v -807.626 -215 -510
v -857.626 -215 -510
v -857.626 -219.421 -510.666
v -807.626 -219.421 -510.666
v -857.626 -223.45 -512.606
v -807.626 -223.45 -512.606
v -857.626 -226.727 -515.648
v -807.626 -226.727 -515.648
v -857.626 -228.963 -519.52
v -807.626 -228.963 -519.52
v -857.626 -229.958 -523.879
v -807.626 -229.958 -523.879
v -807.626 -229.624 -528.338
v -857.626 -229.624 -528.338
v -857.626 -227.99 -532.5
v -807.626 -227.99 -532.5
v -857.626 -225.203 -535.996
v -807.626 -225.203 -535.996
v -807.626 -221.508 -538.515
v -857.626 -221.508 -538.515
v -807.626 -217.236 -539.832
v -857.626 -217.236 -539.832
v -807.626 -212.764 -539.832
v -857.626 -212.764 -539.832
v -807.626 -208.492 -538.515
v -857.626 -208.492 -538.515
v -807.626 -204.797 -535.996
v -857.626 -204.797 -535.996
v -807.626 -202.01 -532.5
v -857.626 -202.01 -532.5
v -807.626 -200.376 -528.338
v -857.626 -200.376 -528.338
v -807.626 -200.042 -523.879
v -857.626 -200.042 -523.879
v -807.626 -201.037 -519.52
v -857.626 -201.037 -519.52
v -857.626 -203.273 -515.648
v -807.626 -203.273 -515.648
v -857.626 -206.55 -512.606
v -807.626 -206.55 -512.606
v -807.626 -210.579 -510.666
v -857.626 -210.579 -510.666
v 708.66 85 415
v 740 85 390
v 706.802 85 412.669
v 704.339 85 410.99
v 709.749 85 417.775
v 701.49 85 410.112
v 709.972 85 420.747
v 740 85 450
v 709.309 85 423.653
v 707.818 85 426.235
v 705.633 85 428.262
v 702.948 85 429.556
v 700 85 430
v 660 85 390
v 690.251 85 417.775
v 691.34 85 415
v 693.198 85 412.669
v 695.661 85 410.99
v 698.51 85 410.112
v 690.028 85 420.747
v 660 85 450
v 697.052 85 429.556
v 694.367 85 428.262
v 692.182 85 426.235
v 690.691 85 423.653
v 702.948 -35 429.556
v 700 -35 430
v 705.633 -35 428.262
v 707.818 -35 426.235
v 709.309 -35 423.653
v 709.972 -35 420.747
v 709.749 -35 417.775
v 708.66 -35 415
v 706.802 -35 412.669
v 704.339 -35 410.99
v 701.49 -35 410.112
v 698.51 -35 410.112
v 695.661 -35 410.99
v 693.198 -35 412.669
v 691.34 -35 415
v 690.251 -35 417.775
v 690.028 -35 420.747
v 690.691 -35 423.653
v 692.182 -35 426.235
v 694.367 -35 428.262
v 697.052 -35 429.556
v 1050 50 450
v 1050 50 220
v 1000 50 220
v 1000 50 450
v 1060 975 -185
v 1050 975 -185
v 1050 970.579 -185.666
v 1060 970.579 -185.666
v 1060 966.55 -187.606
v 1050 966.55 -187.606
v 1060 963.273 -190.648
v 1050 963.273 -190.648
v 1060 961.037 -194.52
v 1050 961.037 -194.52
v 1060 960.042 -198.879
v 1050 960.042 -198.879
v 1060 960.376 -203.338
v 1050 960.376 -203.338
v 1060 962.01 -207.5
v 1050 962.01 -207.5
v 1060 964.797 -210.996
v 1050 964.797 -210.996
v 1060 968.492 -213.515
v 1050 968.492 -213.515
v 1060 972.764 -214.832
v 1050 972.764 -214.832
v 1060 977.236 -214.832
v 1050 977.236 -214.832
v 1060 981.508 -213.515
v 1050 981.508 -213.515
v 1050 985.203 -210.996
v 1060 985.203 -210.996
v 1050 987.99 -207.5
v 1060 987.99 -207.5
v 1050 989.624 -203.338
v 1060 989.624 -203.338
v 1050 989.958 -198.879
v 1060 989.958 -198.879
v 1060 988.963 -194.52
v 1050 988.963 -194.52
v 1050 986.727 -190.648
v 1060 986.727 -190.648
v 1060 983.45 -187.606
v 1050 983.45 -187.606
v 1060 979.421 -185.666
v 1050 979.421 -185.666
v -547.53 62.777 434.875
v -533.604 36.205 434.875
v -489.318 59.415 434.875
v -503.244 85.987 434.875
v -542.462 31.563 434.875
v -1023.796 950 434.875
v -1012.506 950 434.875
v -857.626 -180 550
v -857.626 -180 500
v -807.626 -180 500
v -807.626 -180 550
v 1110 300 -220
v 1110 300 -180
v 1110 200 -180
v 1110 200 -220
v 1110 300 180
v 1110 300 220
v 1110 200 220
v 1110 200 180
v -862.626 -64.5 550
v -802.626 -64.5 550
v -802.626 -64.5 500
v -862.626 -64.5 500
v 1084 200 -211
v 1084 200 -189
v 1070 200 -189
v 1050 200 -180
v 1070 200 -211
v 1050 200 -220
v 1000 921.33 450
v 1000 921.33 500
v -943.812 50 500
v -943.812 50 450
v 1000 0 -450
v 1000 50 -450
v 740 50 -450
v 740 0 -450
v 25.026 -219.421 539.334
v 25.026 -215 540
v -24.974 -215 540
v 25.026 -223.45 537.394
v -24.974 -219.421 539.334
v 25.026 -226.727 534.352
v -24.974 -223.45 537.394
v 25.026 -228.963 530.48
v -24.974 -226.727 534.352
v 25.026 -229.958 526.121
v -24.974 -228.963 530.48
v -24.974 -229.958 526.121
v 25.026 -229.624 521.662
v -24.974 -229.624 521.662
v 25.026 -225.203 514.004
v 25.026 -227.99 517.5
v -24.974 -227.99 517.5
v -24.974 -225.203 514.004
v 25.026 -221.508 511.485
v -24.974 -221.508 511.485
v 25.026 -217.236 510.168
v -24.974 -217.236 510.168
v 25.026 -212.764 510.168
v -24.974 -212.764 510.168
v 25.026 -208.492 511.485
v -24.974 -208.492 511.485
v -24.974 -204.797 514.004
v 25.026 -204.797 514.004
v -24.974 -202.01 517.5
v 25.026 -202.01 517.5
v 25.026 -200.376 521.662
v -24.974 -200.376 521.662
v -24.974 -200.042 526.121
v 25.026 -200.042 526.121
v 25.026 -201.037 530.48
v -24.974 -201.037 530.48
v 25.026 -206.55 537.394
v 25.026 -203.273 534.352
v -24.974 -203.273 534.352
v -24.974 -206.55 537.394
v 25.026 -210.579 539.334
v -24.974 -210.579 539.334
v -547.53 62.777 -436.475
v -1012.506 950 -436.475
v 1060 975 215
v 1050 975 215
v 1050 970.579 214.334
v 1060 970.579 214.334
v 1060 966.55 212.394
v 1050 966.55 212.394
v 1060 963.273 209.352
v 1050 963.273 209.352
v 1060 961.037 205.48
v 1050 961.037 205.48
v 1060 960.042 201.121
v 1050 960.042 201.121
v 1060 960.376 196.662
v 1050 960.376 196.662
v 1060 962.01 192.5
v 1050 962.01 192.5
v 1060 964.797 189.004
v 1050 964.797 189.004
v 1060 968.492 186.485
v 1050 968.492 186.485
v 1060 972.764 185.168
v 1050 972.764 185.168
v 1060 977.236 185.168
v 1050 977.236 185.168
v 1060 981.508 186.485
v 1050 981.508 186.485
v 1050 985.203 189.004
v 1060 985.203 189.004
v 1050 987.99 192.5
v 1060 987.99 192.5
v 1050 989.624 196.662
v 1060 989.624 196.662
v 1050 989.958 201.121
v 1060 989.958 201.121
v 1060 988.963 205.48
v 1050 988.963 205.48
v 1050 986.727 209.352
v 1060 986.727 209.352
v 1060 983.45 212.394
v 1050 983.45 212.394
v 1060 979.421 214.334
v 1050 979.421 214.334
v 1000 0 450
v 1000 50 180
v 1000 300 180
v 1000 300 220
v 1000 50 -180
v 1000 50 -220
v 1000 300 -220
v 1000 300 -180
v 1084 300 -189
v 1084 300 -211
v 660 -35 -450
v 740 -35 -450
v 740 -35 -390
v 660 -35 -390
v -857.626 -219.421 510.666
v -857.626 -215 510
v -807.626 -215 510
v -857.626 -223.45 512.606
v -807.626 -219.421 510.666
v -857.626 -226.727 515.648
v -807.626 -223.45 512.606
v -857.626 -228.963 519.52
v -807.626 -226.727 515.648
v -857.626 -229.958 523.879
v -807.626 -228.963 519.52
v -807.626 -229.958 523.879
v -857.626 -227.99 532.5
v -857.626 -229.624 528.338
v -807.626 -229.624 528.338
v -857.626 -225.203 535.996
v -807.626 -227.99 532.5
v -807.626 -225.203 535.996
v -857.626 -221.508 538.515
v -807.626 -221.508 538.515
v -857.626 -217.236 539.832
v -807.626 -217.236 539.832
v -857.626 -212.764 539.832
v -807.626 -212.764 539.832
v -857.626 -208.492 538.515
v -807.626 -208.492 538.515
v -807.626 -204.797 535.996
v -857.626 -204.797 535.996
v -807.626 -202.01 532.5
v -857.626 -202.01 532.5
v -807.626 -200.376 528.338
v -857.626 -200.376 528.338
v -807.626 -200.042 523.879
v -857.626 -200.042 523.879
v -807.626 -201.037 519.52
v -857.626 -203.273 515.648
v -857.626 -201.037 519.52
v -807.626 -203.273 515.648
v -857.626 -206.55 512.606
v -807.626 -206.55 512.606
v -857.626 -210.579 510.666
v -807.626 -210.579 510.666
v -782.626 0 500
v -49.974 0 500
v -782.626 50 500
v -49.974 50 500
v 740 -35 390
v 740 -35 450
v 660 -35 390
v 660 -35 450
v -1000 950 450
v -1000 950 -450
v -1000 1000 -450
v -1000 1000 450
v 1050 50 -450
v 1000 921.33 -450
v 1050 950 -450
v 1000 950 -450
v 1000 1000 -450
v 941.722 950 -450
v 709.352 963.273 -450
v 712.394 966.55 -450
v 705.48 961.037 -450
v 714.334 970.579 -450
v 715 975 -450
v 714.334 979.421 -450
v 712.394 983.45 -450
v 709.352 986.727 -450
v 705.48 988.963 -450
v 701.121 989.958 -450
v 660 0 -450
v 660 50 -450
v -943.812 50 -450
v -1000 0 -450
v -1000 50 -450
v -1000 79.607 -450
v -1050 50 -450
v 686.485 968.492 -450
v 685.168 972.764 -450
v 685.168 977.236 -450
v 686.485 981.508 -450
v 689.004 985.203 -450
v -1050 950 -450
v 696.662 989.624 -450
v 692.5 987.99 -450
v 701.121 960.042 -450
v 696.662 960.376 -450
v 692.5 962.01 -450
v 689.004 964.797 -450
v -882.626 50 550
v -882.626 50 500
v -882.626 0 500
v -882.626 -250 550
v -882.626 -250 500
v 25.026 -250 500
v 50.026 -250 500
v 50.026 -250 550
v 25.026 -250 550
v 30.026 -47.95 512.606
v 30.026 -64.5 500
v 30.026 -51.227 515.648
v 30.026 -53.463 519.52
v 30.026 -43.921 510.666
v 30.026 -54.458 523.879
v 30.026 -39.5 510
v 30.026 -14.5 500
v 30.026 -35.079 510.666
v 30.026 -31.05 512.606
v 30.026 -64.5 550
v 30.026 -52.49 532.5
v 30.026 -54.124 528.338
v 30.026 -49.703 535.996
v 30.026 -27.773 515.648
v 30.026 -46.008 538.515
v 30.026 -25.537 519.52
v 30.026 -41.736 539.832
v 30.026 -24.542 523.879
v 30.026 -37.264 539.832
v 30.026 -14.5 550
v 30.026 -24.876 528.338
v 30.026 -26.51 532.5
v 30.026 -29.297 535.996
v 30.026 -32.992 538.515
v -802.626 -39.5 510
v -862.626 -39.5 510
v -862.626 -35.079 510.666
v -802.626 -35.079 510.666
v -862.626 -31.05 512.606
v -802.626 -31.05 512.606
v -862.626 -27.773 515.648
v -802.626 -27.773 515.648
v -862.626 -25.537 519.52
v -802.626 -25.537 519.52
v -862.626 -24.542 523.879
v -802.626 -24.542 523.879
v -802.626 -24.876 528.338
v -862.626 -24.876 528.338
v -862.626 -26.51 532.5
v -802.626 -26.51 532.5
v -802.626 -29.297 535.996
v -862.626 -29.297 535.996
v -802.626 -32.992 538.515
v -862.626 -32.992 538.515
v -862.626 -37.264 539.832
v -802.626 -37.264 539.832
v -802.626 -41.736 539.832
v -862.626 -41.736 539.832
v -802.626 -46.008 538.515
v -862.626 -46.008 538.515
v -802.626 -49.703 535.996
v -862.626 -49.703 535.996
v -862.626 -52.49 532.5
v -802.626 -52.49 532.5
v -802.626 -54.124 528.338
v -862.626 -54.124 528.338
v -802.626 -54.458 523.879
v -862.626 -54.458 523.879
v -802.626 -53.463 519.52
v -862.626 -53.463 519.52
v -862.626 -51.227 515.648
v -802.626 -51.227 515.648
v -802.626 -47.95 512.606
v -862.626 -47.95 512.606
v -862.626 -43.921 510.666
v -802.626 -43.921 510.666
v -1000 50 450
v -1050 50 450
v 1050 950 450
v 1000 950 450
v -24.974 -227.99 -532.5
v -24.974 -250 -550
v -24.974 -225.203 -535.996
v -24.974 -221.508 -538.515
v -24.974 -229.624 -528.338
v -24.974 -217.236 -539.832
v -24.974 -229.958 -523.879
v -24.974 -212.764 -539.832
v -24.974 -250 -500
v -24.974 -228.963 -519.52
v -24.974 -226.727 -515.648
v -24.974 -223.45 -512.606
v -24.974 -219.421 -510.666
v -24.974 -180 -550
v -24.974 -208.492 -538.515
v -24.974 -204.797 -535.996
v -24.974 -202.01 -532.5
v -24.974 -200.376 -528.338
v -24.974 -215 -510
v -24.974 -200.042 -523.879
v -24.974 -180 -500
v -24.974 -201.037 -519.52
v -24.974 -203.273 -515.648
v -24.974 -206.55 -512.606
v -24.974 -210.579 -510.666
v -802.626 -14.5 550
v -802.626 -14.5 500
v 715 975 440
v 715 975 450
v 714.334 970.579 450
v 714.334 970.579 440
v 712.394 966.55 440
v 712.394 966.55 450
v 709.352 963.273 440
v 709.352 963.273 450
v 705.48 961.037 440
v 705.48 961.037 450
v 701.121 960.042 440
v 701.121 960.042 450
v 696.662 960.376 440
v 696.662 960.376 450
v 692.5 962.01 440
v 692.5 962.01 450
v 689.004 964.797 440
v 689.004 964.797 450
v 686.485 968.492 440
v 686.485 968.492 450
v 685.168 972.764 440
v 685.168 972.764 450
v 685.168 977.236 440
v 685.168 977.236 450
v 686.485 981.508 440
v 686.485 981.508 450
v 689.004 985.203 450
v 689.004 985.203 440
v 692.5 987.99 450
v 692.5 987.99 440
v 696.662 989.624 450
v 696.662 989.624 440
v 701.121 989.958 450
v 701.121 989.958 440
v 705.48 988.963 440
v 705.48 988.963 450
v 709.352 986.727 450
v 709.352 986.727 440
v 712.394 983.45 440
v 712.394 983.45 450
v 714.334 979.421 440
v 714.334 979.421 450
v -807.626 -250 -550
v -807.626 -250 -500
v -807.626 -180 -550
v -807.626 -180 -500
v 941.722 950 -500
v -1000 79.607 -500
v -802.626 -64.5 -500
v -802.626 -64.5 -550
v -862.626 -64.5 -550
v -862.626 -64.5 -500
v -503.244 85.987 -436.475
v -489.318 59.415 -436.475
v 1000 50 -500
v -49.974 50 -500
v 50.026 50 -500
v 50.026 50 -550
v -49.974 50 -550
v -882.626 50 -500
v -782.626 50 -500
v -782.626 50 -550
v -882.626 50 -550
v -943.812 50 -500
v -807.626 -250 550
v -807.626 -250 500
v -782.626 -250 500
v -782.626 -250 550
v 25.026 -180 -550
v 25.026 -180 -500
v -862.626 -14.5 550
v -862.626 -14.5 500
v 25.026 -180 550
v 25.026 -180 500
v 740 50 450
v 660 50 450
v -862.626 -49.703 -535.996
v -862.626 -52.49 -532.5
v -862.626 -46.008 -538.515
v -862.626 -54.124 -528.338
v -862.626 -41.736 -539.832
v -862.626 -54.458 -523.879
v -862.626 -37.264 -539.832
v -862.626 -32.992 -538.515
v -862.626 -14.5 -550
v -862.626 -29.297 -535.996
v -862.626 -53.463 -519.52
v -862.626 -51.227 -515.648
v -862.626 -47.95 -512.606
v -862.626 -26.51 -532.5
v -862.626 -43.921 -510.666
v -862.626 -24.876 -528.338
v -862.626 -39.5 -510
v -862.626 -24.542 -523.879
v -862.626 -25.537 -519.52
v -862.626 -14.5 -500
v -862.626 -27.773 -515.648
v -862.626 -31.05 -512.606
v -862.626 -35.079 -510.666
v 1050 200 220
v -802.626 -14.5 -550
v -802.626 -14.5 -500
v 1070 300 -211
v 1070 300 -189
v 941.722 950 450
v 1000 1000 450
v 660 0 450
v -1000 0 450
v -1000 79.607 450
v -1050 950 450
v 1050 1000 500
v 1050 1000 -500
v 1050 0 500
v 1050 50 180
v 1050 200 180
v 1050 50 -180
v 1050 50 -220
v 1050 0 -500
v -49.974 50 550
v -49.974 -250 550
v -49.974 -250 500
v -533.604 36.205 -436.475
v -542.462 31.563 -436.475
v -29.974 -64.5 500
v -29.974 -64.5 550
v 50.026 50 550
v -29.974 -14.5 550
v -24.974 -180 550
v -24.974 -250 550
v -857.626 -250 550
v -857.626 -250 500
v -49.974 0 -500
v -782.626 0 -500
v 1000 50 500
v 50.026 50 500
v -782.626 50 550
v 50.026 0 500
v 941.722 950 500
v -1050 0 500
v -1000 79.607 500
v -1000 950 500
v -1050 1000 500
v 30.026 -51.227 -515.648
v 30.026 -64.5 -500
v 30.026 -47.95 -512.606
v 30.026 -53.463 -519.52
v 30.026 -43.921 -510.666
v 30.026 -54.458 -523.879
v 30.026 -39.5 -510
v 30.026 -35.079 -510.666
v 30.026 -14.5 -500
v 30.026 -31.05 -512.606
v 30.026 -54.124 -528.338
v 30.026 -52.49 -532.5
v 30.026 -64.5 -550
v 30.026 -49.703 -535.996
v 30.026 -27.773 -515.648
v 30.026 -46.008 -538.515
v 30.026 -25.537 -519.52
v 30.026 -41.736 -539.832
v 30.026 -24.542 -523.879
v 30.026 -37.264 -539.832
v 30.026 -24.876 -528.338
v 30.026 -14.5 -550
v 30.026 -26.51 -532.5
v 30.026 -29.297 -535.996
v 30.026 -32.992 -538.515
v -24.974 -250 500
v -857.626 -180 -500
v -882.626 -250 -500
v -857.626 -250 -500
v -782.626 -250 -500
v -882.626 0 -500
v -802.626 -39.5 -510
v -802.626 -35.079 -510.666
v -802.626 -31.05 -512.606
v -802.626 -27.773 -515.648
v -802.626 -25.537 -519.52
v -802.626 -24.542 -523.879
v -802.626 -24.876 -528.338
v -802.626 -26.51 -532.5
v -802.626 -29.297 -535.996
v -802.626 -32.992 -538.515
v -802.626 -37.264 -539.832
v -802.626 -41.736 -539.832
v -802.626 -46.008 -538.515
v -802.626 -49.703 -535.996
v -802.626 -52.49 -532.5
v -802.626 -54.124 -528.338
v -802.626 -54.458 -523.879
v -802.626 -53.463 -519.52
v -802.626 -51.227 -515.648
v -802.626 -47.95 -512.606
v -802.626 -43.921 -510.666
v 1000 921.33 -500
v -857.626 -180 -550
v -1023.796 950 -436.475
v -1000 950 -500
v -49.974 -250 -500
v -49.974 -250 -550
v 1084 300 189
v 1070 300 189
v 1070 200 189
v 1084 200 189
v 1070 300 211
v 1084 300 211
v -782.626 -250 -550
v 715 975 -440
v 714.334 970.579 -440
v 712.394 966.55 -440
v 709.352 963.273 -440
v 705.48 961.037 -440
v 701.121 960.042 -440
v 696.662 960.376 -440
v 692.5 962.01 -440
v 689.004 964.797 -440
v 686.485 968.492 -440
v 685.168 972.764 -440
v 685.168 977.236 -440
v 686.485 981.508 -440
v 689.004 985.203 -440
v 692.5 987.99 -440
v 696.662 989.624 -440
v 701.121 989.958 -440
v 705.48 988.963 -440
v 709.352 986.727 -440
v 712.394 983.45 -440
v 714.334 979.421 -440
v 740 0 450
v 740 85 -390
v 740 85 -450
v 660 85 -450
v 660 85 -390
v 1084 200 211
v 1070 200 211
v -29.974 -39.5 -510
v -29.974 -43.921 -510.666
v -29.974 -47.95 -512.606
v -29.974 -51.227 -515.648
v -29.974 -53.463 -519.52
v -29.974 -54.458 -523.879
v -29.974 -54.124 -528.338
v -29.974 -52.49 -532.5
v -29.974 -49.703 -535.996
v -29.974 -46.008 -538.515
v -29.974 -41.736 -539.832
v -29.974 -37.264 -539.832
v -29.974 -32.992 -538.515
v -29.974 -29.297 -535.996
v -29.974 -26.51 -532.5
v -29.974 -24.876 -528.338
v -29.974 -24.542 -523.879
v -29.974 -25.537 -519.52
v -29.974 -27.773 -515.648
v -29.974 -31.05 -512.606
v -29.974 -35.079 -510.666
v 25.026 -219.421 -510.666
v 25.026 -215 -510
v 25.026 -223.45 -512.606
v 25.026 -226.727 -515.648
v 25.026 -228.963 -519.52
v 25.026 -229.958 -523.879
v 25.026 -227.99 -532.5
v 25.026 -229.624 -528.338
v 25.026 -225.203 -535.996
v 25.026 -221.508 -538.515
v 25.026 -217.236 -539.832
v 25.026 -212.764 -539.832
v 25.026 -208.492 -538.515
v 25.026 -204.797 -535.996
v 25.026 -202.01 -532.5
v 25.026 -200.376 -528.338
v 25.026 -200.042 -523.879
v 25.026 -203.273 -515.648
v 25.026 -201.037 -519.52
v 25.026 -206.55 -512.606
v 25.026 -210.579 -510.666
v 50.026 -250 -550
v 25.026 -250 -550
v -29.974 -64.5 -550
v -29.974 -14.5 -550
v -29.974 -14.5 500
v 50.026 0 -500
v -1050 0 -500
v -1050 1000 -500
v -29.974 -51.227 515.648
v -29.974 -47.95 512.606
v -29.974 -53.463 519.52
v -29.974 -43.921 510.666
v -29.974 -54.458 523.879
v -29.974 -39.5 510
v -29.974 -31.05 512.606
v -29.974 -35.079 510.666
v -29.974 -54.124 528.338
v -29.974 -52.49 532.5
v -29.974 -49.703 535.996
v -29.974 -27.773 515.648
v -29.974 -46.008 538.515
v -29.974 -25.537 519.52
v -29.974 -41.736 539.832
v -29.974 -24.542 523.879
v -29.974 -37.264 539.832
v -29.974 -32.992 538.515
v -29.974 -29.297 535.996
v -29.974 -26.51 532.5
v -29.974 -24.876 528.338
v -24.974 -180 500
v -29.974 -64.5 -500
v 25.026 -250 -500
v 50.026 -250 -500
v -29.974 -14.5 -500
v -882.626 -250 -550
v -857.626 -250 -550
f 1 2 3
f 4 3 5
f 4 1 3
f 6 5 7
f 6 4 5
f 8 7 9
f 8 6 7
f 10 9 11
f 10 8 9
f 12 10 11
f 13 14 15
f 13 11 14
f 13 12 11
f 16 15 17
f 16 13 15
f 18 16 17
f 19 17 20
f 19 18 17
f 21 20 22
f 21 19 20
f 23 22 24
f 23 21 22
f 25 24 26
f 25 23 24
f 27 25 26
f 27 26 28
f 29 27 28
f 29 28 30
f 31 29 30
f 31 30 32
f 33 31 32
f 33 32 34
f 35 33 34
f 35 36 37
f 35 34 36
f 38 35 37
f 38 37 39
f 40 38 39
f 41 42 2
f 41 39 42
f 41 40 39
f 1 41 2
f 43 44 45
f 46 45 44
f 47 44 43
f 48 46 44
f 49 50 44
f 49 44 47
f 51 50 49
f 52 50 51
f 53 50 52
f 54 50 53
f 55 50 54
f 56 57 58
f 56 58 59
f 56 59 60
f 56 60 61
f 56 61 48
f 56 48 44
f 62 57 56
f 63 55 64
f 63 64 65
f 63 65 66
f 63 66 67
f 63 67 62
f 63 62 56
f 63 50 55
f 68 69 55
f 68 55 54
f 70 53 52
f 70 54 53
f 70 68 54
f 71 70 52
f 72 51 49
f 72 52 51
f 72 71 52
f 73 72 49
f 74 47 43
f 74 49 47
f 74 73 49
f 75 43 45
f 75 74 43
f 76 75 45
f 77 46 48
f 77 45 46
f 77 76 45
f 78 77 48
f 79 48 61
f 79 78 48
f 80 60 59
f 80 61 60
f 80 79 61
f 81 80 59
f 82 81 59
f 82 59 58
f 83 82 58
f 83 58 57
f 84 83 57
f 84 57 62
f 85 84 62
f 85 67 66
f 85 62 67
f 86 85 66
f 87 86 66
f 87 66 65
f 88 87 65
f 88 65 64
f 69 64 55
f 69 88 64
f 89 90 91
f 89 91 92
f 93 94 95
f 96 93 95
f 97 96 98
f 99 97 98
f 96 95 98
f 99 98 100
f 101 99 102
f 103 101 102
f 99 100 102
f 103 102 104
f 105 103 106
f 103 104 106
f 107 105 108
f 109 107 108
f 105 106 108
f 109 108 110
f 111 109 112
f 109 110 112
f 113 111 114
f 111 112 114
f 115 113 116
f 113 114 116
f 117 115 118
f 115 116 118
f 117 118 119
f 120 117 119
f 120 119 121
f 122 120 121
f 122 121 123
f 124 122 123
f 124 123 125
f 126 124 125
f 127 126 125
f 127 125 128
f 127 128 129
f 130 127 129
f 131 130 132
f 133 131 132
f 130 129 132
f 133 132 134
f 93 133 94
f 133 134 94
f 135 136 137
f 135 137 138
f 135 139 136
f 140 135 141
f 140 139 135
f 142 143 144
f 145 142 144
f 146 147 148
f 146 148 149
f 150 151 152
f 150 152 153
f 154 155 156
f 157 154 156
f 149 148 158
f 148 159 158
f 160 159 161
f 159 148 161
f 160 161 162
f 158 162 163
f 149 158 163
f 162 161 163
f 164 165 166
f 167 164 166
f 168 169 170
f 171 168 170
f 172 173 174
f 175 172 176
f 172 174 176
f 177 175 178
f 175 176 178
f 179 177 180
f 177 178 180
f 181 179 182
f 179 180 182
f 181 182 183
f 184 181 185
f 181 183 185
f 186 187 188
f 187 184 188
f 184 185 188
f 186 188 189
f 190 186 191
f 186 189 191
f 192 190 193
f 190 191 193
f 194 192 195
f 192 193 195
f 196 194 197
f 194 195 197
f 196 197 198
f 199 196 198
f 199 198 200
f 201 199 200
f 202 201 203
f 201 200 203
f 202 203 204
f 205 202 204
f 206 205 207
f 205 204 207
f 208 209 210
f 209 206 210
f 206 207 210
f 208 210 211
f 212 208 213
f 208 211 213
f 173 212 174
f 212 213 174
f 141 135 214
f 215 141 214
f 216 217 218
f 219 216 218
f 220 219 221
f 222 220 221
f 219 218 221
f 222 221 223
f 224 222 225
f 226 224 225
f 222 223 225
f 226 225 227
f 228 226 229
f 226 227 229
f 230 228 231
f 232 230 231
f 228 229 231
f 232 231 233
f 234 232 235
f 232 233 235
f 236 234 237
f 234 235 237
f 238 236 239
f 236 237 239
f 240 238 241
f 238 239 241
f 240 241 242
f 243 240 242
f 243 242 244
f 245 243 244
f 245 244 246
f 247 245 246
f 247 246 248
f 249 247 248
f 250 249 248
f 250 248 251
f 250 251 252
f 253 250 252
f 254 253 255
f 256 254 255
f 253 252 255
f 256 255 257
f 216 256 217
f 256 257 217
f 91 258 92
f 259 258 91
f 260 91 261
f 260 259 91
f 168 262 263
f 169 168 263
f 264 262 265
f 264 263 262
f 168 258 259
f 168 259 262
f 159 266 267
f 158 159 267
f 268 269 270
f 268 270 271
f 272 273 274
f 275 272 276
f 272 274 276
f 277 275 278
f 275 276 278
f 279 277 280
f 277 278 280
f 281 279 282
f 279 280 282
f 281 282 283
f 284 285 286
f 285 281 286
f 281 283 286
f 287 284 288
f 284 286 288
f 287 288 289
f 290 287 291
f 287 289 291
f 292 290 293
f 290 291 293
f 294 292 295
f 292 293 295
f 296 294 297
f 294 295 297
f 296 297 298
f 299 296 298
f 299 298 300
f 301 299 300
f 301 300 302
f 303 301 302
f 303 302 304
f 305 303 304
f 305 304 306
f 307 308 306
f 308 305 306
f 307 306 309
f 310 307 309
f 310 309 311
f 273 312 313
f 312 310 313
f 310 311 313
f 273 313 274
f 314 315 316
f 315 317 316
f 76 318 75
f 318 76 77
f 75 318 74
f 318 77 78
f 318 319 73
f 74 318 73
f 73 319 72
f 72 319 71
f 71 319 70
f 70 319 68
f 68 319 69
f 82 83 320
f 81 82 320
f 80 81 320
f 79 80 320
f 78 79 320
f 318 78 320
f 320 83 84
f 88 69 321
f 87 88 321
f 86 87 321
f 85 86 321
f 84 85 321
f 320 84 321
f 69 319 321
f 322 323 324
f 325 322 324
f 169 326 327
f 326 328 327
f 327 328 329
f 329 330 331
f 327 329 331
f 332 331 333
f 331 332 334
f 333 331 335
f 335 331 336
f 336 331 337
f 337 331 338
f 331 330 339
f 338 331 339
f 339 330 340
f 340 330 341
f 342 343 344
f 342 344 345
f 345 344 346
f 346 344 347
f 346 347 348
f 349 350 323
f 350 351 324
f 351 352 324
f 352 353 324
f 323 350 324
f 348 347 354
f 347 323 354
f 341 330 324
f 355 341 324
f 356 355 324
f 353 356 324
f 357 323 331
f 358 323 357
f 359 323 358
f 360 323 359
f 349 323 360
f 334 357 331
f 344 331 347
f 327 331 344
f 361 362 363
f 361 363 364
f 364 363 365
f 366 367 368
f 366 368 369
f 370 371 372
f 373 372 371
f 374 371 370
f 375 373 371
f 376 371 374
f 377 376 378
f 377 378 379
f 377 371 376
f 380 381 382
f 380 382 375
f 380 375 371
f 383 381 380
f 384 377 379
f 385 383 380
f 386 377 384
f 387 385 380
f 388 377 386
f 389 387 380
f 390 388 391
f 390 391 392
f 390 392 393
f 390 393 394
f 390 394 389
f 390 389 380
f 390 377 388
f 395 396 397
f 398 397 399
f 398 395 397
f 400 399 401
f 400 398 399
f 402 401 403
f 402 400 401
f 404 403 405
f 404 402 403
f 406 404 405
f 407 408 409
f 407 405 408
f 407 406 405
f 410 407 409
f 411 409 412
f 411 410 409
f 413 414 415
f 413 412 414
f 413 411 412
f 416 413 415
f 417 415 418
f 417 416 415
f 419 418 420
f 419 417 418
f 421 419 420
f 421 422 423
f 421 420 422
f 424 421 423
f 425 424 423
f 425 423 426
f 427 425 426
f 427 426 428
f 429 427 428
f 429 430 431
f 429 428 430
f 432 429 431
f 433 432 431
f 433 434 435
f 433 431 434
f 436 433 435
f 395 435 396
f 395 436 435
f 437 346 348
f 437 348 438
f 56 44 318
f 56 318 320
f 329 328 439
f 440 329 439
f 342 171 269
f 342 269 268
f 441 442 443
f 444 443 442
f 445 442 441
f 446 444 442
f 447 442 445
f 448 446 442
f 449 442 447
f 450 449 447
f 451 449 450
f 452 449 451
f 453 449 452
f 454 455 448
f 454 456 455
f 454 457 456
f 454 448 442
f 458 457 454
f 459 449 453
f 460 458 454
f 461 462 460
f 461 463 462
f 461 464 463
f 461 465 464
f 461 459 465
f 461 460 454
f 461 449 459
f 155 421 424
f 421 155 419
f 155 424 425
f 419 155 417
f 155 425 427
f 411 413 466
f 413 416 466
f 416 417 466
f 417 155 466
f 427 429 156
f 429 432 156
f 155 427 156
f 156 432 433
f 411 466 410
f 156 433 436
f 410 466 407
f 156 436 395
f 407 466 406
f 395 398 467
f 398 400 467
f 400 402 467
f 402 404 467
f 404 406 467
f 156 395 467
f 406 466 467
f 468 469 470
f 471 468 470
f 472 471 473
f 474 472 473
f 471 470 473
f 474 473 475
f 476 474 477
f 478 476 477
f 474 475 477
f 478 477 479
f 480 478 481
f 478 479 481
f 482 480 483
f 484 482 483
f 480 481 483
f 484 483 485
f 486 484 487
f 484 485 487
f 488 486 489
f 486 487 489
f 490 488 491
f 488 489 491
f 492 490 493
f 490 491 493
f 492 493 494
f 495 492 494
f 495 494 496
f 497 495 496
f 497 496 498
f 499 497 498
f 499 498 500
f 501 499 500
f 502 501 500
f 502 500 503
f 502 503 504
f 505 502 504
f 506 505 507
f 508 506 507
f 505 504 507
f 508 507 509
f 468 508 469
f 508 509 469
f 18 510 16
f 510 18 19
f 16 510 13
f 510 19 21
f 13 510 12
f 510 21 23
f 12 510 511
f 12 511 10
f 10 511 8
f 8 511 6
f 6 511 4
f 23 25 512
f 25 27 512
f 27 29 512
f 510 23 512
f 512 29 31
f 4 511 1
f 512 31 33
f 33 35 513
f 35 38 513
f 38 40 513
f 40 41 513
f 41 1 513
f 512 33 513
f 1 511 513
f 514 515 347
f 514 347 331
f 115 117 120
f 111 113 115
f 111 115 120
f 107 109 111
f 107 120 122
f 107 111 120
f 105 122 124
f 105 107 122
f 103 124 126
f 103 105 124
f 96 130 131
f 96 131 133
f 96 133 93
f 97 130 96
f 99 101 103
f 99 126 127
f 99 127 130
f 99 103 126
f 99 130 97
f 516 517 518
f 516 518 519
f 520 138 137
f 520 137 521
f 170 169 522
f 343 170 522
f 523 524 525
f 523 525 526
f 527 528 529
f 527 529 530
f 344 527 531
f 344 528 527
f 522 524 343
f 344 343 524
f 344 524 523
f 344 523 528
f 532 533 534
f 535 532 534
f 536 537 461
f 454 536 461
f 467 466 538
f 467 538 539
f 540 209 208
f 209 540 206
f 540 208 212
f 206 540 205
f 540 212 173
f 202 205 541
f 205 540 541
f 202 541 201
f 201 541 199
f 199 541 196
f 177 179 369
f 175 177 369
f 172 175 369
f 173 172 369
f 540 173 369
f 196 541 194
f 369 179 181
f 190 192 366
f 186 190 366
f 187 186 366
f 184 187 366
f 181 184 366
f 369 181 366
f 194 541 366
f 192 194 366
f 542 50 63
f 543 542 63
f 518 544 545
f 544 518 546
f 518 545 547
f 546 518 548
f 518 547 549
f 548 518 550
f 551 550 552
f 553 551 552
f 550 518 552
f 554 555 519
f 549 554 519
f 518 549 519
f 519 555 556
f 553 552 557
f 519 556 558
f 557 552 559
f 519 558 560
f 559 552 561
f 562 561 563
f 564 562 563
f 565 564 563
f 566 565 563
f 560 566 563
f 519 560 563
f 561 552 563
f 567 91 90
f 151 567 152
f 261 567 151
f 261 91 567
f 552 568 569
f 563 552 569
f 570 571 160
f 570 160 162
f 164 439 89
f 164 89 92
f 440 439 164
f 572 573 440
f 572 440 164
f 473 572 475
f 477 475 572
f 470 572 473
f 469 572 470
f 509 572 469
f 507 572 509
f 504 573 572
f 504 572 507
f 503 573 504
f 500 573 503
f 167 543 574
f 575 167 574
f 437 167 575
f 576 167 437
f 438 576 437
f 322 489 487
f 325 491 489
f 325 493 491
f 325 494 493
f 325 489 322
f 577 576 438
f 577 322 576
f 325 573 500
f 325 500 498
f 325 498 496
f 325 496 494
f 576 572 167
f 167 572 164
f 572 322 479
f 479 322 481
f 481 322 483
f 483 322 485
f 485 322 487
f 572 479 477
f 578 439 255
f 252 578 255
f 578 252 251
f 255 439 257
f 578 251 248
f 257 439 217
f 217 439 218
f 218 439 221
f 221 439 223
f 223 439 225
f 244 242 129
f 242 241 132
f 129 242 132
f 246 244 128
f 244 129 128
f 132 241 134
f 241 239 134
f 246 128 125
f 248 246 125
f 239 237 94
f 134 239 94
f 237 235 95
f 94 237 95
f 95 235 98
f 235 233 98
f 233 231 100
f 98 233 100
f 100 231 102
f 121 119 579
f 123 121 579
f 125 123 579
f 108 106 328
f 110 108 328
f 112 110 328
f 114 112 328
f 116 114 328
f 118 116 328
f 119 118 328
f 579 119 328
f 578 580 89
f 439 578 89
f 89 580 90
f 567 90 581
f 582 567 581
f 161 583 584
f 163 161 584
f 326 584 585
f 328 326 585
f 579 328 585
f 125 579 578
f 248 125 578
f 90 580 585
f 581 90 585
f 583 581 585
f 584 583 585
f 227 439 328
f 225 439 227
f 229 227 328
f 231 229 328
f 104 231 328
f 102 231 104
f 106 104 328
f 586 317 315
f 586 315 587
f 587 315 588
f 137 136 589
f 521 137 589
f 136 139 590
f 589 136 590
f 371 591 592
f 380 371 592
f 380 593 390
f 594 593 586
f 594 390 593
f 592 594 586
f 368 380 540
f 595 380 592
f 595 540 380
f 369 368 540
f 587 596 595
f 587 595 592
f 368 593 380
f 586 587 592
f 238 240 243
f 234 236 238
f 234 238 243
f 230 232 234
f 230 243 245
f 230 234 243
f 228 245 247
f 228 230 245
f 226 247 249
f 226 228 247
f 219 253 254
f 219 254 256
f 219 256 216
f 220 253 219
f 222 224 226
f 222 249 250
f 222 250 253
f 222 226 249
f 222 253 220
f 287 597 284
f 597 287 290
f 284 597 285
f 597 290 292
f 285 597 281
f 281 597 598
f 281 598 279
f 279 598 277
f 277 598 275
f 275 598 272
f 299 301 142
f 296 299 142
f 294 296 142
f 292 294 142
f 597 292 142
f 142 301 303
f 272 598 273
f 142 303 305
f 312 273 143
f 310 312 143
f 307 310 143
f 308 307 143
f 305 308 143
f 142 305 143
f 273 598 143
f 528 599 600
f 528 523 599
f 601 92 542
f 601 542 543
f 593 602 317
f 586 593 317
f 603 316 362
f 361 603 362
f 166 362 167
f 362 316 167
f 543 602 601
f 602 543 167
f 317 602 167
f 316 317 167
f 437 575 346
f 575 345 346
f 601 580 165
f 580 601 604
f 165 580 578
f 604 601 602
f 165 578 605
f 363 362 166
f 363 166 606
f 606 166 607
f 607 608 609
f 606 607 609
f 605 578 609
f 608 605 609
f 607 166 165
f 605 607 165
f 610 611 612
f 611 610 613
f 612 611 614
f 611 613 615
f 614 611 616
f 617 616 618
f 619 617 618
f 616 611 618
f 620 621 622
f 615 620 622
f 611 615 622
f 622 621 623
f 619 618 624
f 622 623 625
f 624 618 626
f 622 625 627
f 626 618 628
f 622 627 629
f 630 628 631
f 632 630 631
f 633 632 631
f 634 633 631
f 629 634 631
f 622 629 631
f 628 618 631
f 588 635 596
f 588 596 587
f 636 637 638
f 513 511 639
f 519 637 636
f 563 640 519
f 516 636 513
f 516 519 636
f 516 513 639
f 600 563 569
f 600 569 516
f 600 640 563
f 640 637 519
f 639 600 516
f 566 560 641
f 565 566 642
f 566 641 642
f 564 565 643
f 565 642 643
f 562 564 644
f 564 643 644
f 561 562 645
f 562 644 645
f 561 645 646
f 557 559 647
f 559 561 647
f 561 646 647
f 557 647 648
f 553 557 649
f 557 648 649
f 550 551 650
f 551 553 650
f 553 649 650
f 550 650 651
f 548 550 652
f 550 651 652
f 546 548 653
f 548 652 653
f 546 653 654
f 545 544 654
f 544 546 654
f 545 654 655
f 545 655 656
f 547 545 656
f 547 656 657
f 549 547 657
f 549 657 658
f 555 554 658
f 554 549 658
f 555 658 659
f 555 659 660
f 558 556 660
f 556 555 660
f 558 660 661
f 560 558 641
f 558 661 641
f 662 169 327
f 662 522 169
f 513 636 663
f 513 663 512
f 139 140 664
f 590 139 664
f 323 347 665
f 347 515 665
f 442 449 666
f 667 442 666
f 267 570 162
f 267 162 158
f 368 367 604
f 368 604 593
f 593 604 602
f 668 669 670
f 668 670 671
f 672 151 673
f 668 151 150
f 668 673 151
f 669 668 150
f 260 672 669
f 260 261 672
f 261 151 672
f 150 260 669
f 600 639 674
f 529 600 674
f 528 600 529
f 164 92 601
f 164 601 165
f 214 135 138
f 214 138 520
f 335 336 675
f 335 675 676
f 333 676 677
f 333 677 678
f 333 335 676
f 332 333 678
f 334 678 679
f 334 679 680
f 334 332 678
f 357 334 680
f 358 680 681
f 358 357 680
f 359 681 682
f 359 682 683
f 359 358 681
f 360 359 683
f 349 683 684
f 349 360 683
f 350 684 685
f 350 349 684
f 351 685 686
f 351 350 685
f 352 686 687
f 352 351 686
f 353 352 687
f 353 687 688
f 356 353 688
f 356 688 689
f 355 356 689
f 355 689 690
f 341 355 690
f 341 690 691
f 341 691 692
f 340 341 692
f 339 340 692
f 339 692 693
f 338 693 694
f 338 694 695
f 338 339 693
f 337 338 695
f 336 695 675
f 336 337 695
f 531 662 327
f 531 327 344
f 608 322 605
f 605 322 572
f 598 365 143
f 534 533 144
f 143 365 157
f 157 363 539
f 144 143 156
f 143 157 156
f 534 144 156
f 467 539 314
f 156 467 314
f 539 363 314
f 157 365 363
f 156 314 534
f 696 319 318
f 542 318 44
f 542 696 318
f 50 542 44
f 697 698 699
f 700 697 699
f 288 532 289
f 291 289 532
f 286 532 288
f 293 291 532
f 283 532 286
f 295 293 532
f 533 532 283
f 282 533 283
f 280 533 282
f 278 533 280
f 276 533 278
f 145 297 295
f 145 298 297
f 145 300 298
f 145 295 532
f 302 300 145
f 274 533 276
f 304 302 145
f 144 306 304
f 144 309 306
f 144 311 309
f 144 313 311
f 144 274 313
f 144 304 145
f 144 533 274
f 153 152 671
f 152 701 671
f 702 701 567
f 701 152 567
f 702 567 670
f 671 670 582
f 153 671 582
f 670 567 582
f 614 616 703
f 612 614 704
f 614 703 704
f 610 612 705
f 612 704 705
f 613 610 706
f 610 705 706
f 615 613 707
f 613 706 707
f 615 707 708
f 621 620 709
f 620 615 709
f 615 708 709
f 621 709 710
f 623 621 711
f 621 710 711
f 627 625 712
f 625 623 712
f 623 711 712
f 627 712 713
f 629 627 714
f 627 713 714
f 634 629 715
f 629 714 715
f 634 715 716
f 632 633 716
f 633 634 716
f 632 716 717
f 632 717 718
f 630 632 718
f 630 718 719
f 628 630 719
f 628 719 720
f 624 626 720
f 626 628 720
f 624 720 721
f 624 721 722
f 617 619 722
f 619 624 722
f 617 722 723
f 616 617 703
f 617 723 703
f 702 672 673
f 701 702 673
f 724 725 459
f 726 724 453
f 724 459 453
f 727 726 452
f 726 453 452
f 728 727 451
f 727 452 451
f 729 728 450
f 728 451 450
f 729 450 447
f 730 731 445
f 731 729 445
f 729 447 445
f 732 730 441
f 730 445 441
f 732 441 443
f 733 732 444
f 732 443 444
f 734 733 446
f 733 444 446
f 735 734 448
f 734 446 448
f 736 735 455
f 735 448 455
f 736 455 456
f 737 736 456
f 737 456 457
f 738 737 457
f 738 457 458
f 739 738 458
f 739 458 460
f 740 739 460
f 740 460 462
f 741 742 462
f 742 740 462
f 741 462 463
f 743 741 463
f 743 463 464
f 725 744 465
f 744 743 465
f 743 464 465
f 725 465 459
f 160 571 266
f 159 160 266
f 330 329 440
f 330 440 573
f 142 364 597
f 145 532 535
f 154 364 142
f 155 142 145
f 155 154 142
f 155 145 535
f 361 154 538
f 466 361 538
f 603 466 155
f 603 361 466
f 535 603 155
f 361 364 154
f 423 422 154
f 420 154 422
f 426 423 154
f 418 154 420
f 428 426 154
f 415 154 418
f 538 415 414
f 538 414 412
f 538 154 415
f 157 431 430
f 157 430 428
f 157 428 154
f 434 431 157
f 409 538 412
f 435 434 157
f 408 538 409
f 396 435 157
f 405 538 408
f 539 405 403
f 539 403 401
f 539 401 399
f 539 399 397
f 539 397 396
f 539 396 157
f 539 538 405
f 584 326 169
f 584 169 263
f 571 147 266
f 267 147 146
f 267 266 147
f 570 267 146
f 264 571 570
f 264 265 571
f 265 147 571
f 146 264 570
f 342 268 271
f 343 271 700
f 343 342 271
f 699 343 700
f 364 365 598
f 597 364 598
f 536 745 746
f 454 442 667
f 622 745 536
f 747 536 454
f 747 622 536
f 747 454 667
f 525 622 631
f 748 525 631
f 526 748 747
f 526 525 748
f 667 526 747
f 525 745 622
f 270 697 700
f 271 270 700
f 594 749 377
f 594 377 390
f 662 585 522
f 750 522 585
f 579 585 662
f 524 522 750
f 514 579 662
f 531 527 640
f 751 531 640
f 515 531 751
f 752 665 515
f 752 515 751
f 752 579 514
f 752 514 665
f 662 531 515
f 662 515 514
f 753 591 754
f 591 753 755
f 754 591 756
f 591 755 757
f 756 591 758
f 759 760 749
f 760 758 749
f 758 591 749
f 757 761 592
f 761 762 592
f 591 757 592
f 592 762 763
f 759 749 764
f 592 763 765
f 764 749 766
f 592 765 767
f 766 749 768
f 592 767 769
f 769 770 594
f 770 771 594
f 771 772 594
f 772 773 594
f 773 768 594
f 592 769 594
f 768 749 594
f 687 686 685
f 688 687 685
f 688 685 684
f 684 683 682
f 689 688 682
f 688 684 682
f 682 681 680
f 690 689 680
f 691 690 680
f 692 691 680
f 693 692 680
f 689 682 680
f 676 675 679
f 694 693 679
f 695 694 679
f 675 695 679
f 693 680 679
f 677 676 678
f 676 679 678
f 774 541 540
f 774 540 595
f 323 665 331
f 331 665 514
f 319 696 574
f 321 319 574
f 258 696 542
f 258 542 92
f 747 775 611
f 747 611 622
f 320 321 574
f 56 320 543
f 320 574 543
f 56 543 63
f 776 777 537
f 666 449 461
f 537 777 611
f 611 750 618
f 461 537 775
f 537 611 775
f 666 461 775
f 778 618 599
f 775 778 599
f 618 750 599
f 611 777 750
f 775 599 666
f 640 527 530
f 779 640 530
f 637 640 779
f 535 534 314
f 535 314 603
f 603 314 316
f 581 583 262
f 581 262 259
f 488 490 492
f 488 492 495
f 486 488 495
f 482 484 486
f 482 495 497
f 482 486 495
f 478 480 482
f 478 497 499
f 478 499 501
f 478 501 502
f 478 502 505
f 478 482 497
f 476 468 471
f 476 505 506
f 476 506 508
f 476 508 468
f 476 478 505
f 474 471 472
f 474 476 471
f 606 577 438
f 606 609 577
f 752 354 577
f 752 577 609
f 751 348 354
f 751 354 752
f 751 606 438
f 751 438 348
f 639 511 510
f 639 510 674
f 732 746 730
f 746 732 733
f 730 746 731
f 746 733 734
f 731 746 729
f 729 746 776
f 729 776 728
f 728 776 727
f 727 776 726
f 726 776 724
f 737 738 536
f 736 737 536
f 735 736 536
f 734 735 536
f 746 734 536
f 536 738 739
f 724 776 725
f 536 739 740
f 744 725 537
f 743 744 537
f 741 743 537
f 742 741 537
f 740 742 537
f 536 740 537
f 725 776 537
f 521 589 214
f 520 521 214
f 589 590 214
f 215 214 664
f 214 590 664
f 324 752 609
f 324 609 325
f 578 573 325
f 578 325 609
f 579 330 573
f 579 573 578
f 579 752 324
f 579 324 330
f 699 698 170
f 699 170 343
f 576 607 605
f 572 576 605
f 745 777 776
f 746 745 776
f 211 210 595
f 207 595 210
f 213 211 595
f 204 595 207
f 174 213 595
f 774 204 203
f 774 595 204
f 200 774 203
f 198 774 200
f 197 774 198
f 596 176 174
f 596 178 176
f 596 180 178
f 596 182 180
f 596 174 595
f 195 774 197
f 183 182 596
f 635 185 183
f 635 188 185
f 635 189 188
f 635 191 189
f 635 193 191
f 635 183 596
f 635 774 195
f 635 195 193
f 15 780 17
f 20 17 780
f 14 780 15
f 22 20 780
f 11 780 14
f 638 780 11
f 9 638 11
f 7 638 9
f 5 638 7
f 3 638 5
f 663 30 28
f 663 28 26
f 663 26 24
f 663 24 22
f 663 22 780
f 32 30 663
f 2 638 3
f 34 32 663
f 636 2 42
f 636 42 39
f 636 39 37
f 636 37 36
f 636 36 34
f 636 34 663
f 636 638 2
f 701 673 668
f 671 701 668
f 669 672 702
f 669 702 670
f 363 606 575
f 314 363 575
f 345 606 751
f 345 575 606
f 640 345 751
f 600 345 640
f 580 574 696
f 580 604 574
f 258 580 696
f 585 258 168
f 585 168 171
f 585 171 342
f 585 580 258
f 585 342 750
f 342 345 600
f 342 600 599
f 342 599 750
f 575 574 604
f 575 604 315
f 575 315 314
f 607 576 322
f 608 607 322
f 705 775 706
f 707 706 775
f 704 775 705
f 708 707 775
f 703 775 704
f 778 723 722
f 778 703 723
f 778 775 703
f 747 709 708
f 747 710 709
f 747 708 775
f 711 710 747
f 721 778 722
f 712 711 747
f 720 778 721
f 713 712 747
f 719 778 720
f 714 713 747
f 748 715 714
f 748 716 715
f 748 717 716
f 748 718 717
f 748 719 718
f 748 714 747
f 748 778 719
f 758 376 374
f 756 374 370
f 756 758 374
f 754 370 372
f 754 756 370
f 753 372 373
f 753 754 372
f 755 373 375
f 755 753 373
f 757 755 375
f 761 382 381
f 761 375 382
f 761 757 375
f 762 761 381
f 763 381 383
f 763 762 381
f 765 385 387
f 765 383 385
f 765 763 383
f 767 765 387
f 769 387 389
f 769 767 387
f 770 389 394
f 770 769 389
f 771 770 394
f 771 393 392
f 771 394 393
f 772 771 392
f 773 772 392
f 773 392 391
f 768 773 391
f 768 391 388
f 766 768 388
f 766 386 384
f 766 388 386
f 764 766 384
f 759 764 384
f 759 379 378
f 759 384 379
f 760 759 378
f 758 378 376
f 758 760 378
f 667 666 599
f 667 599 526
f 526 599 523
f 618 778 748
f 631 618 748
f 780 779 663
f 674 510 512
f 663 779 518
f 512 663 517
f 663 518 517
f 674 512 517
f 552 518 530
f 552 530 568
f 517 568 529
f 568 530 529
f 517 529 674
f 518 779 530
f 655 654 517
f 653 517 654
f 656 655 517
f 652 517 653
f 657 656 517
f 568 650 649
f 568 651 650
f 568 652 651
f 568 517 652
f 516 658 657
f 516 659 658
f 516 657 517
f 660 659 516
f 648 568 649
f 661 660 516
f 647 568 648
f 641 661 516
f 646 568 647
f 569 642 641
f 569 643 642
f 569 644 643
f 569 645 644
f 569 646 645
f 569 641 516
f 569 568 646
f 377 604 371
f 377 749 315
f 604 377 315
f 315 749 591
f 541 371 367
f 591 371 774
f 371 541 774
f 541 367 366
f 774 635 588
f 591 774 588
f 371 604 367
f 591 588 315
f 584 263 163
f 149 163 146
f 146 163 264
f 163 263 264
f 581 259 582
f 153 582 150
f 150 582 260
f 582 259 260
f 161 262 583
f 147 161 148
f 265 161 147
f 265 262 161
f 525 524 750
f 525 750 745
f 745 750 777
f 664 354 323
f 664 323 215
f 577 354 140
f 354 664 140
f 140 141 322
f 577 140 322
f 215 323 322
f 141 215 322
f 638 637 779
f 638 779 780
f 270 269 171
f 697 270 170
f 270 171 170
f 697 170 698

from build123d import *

# Parameters (mm, degrees)
SKETCH1_W                 = 2100
SKETCH1_H                 = 1000
BOSS_EXTRUDE1_DEPTH       = 1000
CUT_EXTRUDE1_DEPTH        = 1534.786165018
CUT_EXTRUDE1_DEPTH_BACK   = 1534.786165018
SKETCH2_W                 = 2000
SKETCH2_H                 = 900
CUT_EXTRUDE2_DEPTH        = 1762.391495381
CUT_EXTRUDE2_DEPTH_BACK   = 1762.391495381
SKETCH3_W                 = 2000
SKETCH3_H                 = 900
CUT_EXTRUDE3_DEPTH        = 2380.075450674
CUT_EXTRUDE3_DEPTH_BACK   = 2380.075450674
SKETCH4_W                 = 900
SKETCH4_H                 = 900
SKETCH11_R                = 15
BOSS_EXTRUDE4_DEPTH       = 10
SKETCH13_W                = 80
SKETCH13_H                = 120
BOSS_EXTRUDE6_DEPTH       = 60
CUT_EXTRUDE5_DEPTH        = 1480.771941888
CUT_EXTRUDE5_DEPTH_BACK   = 1480.771941888
SKETCH14_R                = 10
BOSS_EXTRUDE9_DEPTH       = 50
SKETCH18_W                = 25
SKETCH18_H                = 70
SKETCH18_W_2              = 100
SKETCH18_H_2              = 50
BOSS_EXTRUDE10_DEPTH      = 50
BOSS_EXTRUDE11_REACH      = 2182.2
SKETCH19_R                = 15
LPATTERN1_COUNT           = 2
LPATTERN1_PITCH           = 832.6
MIRROR6_COPY_1_SKETCH_W   = 25
MIRROR6_COPY_1_SKETCH_H   = 70
MIRROR6_COPY_1_SKETCH_W_2 = 100
MIRROR6_COPY_1_SKETCH_H_2 = 50
MIRROR6_COPY_1_DEPTH      = 50
MIRROR6_COPY_2_REACH      = 2182.2
MIRROR6_COPY_2_SKETCH_R   = 15
MIRROR6_COPY_3_SKETCH_W   = 25
MIRROR6_COPY_3_SKETCH_H   = 70
MIRROR6_COPY_3_SKETCH_W_2 = 100
MIRROR6_COPY_3_SKETCH_H_2 = 50
MIRROR6_COPY_3_DEPTH      = 50
MIRROR6_COPY_4_REACH      = 2182.2
MIRROR6_COPY_4_SKETCH_R   = 15
SKETCH21_W                = 871.350730207
SKETCH21_H                = 1070.163382418
BOSS_EXTRUDE12_DEPTH      = 10
SKETCH22_W                = 871.350730207
SKETCH22_H                = 30
BOSS_EXTRUDE13_DEPTH      = 50
CUT_EXTRUDE6_DEPTH        = 1520.045753096
CUT_EXTRUDE6_DEPTH_BACK   = 1520.045753096
SKETCH23_W                = 100
SKETCH23_H                = 50
SKETCH24_R                = 15
BOSS_EXTRUDE14_DEPTH      = 10
LPATTERN2_COUNT           = 2
LPATTERN2_PITCH           = 400
SKETCH25_W                = 40
SKETCH25_H                = 300
BOSS_EXTRUDE15_DEPTH      = 50
SKETCH26_W                = 40
SKETCH26_H                = 100
BOSS_EXTRUDE16_DEPTH      = 60
SKETCH27_W                = 14
SKETCH27_H                = 22
CUT_EXTRUDE7_DEPTH        = 1423.884394461
LPATTERN3_COUNT           = 2
LPATTERN3_PITCH           = 400
CUT_EXTRUDE8_START        = -20
SKETCH29_W                = 50
SKETCH29_H                = 50
CUT_EXTRUDE8_DEPTH        = 60
BOSS_EXTRUDE17_REACH      = 2229.249
SKETCH30_R                = 15
CUT_EXTRUDE9_START        = -20
SKETCH31_W                = 50
SKETCH31_H                = 50
CUT_EXTRUDE9_DEPTH        = 60
BOSS_EXTRUDE18_REACH      = 1615.084
SKETCH32_R                = 15


with BuildPart() as part:
    # Sketch1 → Boss-Extrude1 (new body)
    with BuildSketch(Plane(origin=(0, 0, 0), x_dir=(1, 0, 0), z_dir=(0, 1, 0))):
        Rectangle(SKETCH1_W, SKETCH1_H)
    extrude(amount=BOSS_EXTRUDE1_DEPTH)

    # Sketch2 → Cut-Extrude1 (cut, two sides: drawn at the far end of the back side and taken through both)
    with BuildSketch(Plane(origin=(0, 1000, 0), x_dir=(1, 0, 0), z_dir=(0, 1, 0)).offset(-CUT_EXTRUDE1_DEPTH_BACK)):
        Rectangle(SKETCH2_W, SKETCH2_H)
    extrude(amount=CUT_EXTRUDE1_DEPTH + CUT_EXTRUDE1_DEPTH_BACK, mode=Mode.SUBTRACT)

    # Sketch3 → Cut-Extrude2 (cut, two sides: drawn at the far end of the back side and taken through both)
    with BuildSketch(Plane.XY.offset(500).offset(-CUT_EXTRUDE2_DEPTH_BACK)):
        with Locations((0, 500)):
            Rectangle(SKETCH3_W, SKETCH3_H)
    extrude(amount=CUT_EXTRUDE2_DEPTH + CUT_EXTRUDE2_DEPTH_BACK, mode=Mode.SUBTRACT)

    # Sketch4 → Cut-Extrude3 (cut, two sides: drawn at the far end of the back side and taken through both)
    with BuildSketch(Plane.ZY.offset(1050).offset(-CUT_EXTRUDE3_DEPTH_BACK)):
        with Locations((0, 500)):
            Rectangle(SKETCH4_W, SKETCH4_H)
    extrude(amount=CUT_EXTRUDE3_DEPTH + CUT_EXTRUDE3_DEPTH_BACK, mode=Mode.SUBTRACT)

    # Sketch11 → Boss-Extrude4 (add)
    with BuildSketch(Plane(origin=(0, 0, 450), x_dir=(-1, 0, 0), z_dir=(0, 0, -1))):
        with Locations(Location((-700, 975, 0), (0, 0, 180))):
            Circle(SKETCH11_R)
    boss_extrude4 = extrude(amount=BOSS_EXTRUDE4_DEPTH)

    # Sketch13 → Boss-Extrude6 (add)
    with BuildSketch(Plane(origin=(0, 0, 450), x_dir=(-1, 0, 0), z_dir=(0, 0, -1))):
        with Locations((-700, 25)):
            Rectangle(SKETCH13_W, SKETCH13_H)
    boss_extrude6 = extrude(amount=BOSS_EXTRUDE6_DEPTH)

    # Sketch14 → Cut-Extrude5 (cut, two sides: drawn at the far end of the back side and taken through both)
    with BuildSketch(Plane(origin=(0, 85, 0), x_dir=(1, 0, 0), z_dir=(0, 1, 0)).offset(-CUT_EXTRUDE5_DEPTH_BACK)):
        with Locations(Location((700, -420, 0), (0, 0, 270))):
            Circle(SKETCH14_R)
    extrude(amount=CUT_EXTRUDE5_DEPTH + CUT_EXTRUDE5_DEPTH_BACK, mode=Mode.SUBTRACT)

    # Mirror3: Boss-Extrude4 across plane
    add(boss_extrude4.mirror(Plane.XY))

    # Sketch17 → Boss-Extrude9 (add)
    with BuildSketch(Plane(origin=(0, 0, -500), x_dir=(-1, 0, 0), z_dir=(0, 0, -1))):
        Polygon((-1000, 921.329829059), (943.812412752, 50), (1000, 50), (1000, 79.607053118), (-941.722362412, 950), (-1000, 950), align=None)
    boss_extrude9 = extrude(amount=-BOSS_EXTRUDE9_DEPTH)

    # Mirror4: Boss-Extrude9 across plane
    add(boss_extrude9.mirror(Plane.XY))

    # Sketch18 → Boss-Extrude10 (add)
    with BuildSketch(Plane(origin=(0, 0, -500), x_dir=(-1, 0, 0), z_dir=(0, 0, -1))):
        with Locations((-870.12586946, -215)):
            Rectangle(SKETCH18_W, SKETCH18_H)
        with Locations((-795.12586946, -215)):
            Rectangle(SKETCH18_W, SKETCH18_H)
        Polygon((-882.62586946, 0), (-882.62586946, -180), (-857.62586946, -180), (-807.62586946, -180), (-782.62586946, -180), (-782.62586946, 0), align=None)
        with Locations((-832.62586946, 25)):
            Rectangle(SKETCH18_W_2, SKETCH18_H_2)
    boss_extrude10 = extrude(amount=BOSS_EXTRUDE10_DEPTH)

    # Sketch19 → Boss-Extrude11 (add, up to next)
    with BuildSketch(Plane(origin=(807.62586946, 0, 0), x_dir=(0, 0, -1), z_dir=(1, 0, 0)), mode=Mode.PRIVATE) as boss_extrude11_sk1:
        with Locations(Location((525, -215, 0), (0, 0, 180))):
            Circle(SKETCH19_R)
    boss_extrude11_tool1 = extrude(boss_extrude11_sk1.sketch, amount=BOSS_EXTRUDE11_REACH, mode=Mode.PRIVATE) - part.part
    boss_extrude11 = boss_extrude11_tool1.solids().sort_by_distance((807.625869, -215, -525))[0]
    add(boss_extrude11)

    # Mirror5: Boss-Extrude10, Boss-Extrude11 across plane
    add(boss_extrude10.mirror(Plane(origin=(0, 0, 0), x_dir=(0, 0, 1), z_dir=(1, 0, 0))))
    add(boss_extrude11.mirror(Plane(origin=(0, 0, 0), x_dir=(0, 0, 1), z_dir=(1, 0, 0))))

    # LPattern1: Boss-Extrude10, Boss-Extrude11 ×2
    with Locations(*[(-i * LPATTERN1_PITCH, 0, 0) for i in range(1, LPATTERN1_COUNT)]):
        add(boss_extrude10)
        add(boss_extrude11)

    # Mirror6: Boss-Extrude10, Boss-Extrude11 across plane
    add(boss_extrude10.mirror(Plane.XY))
    add(boss_extrude11.mirror(Plane.XY))

    # Mirror6 copy 1 sketch → Mirror6 copy 1 (add)
    with BuildSketch(Plane.XY.offset(500)):
        with Locations((-870.12586946, -215)):
            Rectangle(MIRROR6_COPY_1_SKETCH_W, MIRROR6_COPY_1_SKETCH_H)
        with Locations((-795.12586946, -215)):
            Rectangle(MIRROR6_COPY_1_SKETCH_W, MIRROR6_COPY_1_SKETCH_H)
        Polygon((-882.62586946, 0), (-882.62586946, -180), (-857.62586946, -180), (-807.62586946, -180), (-782.62586946, -180), (-782.62586946, 0), align=None)
        with Locations((-832.62586946, 25)):
            Rectangle(MIRROR6_COPY_1_SKETCH_W_2, MIRROR6_COPY_1_SKETCH_H_2)
    extrude(amount=MIRROR6_COPY_1_DEPTH)

    # Mirror6 copy 2 sketch → Mirror6 copy 2 (add, up to next)
    with BuildSketch(Plane.ZY.offset(807.62586946), mode=Mode.PRIVATE) as mirror6_copy_2_sk1:
        with Locations(Location((525, -215, 0), (0, 0, 180))):
            Circle(MIRROR6_COPY_2_SKETCH_R)
    mirror6_copy_2_tool1 = extrude(mirror6_copy_2_sk1.sketch, amount=MIRROR6_COPY_2_REACH, mode=Mode.PRIVATE) - part.part
    add(mirror6_copy_2_tool1.solids().sort_by_distance((-807.625869, -215, 525))[0])

    # Mirror6 copy 3 sketch → Mirror6 copy 3 (add)
    with BuildSketch(Plane(origin=(-832.6, 0, 500), x_dir=(-1, 0, 0), z_dir=(0, 0, 1))):
        with Locations((-870.12586946, 215)):
            Rectangle(MIRROR6_COPY_3_SKETCH_W, MIRROR6_COPY_3_SKETCH_H)
        with Locations((-795.12586946, 215)):
            Rectangle(MIRROR6_COPY_3_SKETCH_W, MIRROR6_COPY_3_SKETCH_H)
        Polygon((-882.62586946, 0), (-882.62586946, 180), (-857.62586946, 180), (-807.62586946, 180), (-782.62586946, 180), (-782.62586946, 0), align=None)
        with Locations((-832.62586946, -25)):
            Rectangle(MIRROR6_COPY_3_SKETCH_W_2, MIRROR6_COPY_3_SKETCH_H_2)
    extrude(amount=MIRROR6_COPY_3_DEPTH)

    # Mirror6 copy 4 sketch → Mirror6 copy 4 (add, up to next)
    with BuildSketch(Plane(origin=(-24.97413054, 0, 0), x_dir=(0, 0, 1), z_dir=(1, 0, 0)), mode=Mode.PRIVATE) as mirror6_copy_4_sk1:
        with Locations((525, 215)):
            Circle(MIRROR6_COPY_4_SKETCH_R)
    mirror6_copy_4_tool1 = extrude(mirror6_copy_4_sk1.sketch, amount=MIRROR6_COPY_4_REACH, mode=Mode.PRIVATE) - part.part
    add(mirror6_copy_4_tool1.solids().sort_by_distance((-24.974131, -215, 525))[0])

    # Mirror7: Boss-Extrude6 across plane
    add(boss_extrude6.mirror(Plane.XY))

    # Sketch21 → Boss-Extrude12 (add)
    with BuildSketch(Plane(origin=(-412.59648232, -216.23351584, 0), x_dir=(0, 0, -1), z_dir=(0.8857330874212328, 0.4641948920951746, 0))):
        with Locations((0.799880363, 814.846288307)):
            Rectangle(SKETCH21_W, SKETCH21_H)
    extrude(amount=BOSS_EXTRUDE12_DEPTH)

    # Sketch22 → Boss-Extrude13 (add)
    with BuildSketch(Plane(origin=(-403.739151446, -211.591566919, 0), x_dir=(0, 0, -1), z_dir=(0.8857330874212327, 0.4641948920951747, 0))):
        with Locations((0.799880363, 294.764597098)):
            Rectangle(SKETCH22_W, SKETCH22_H)
    extrude(amount=BOSS_EXTRUDE13_DEPTH)

    # Sketch23 → Cut-Extrude6 (cut, two sides: drawn at the far end of the back side and taken through both)
    with BuildSketch(Plane(origin=(0, 50, 0), x_dir=(1, 0, 0), z_dir=(0, 1, 0)).offset(-CUT_EXTRUDE6_DEPTH_BACK)):
        with Locations((832.62586946, 525)):
            Rectangle(SKETCH23_W, SKETCH23_H)
        with Locations((832.62586946, -525)):
            Rectangle(SKETCH23_W, SKETCH23_H)
    extrude(amount=CUT_EXTRUDE6_DEPTH + CUT_EXTRUDE6_DEPTH_BACK, mode=Mode.SUBTRACT)

    # Sketch24 → Boss-Extrude14 (add)
    with BuildSketch(Plane(origin=(1050, 0, 0), x_dir=(0, 0, -1), z_dir=(1, 0, 0))):
        with Locations(Location((-200, 975, 0), (0, 0, 180))):
            Circle(SKETCH24_R)
    boss_extrude14 = extrude(amount=BOSS_EXTRUDE14_DEPTH)

    # LPattern2: Boss-Extrude14 ×2
    with Locations(*[(0, 0, -i * LPATTERN2_PITCH) for i in range(1, LPATTERN2_COUNT)]):
        add(boss_extrude14)

    # Sketch25 → Boss-Extrude15 (add)
    with BuildSketch(Plane(origin=(1050, 0, 0), x_dir=(0, 0, -1), z_dir=(1, 0, 0))):
        with Locations((-200, 150)):
            Rectangle(SKETCH25_W, SKETCH25_H)
    boss_extrude15 = extrude(amount=-BOSS_EXTRUDE15_DEPTH)

    # Sketch26 → Boss-Extrude16 (add)
    with BuildSketch(Plane(origin=(1050, 0, 0), x_dir=(0, 0, -1), z_dir=(1, 0, 0))):
        with Locations((-200, 250)):
            Rectangle(SKETCH26_W, SKETCH26_H)
    boss_extrude16 = extrude(amount=BOSS_EXTRUDE16_DEPTH)

    # Sketch27 → Cut-Extrude7 (cut, symmetric)
    with BuildSketch(Plane(origin=(0, 300, 0), x_dir=(1, 0, 0), z_dir=(0, 1, 0))):
        with Locations((1077, -200)):
            Rectangle(SKETCH27_W, SKETCH27_H)
    cut_extrude7 = extrude(amount=CUT_EXTRUDE7_DEPTH, both=True, mode=Mode.SUBTRACT)

    # LPattern3: Boss-Extrude15, Boss-Extrude16, Cut-Extrude7 ×2
    with Locations(*[(0, 0, -i * LPATTERN3_PITCH) for i in range(1, LPATTERN3_COUNT)]):
        add(boss_extrude15)
        add(boss_extrude16)
        add(cut_extrude7, mode=Mode.SUBTRACT)

    # Sketch29 → Cut-Extrude8 (cut)
    with BuildSketch(Plane.ZY.offset(882.62586946).offset(CUT_EXTRUDE8_START)):
        with Locations((-525, -39.5)):
            Rectangle(SKETCH29_W, SKETCH29_H)
    cut_extrude8 = extrude(amount=-CUT_EXTRUDE8_DEPTH, mode=Mode.SUBTRACT)

    # Sketch30 → Boss-Extrude17 (add, up to next)
    with BuildSketch(Plane.ZY.offset(802.62586946), mode=Mode.PRIVATE) as boss_extrude17_sk1:
        with Locations((-525, -39.5)):
            Circle(SKETCH30_R)
    boss_extrude17_tool1 = extrude(boss_extrude17_sk1.sketch, amount=BOSS_EXTRUDE17_REACH, mode=Mode.PRIVATE) - part.part
    boss_extrude17 = boss_extrude17_tool1.solids().sort_by_distance((-802.625869, -39.5, -525))[0]
    add(boss_extrude17)

    # Sketch31 → Cut-Extrude9 (cut)
    with BuildSketch(Plane(origin=(50.02586946, 0, 0), x_dir=(0, 0, -1), z_dir=(1, 0, 0)).offset(CUT_EXTRUDE9_START)):
        with Locations((525, -39.5)):
            Rectangle(SKETCH31_W, SKETCH31_H)
    cut_extrude9 = extrude(amount=-CUT_EXTRUDE9_DEPTH, mode=Mode.SUBTRACT)

    # Sketch32 → Boss-Extrude18 (add, up to next)
    with BuildSketch(Plane(origin=(-29.97413054, 0, 0), x_dir=(0, 0, -1), z_dir=(1, 0, 0)), mode=Mode.PRIVATE) as boss_extrude18_sk1:
        with Locations(Location((525, -39.5, 0), (0, 0, 180))):
            Circle(SKETCH32_R)
    boss_extrude18_tool1 = extrude(boss_extrude18_sk1.sketch, amount=BOSS_EXTRUDE18_REACH, mode=Mode.PRIVATE) - part.part
    boss_extrude18 = boss_extrude18_tool1.solids().sort_by_distance((-29.974131, -39.5, -525))[0]
    add(boss_extrude18)

    # Mirror8: Cut-Extrude8, Boss-Extrude17, Cut-Extrude9, Boss-Extrude18 across plane
    add(cut_extrude8.mirror(Plane.XY), mode=Mode.SUBTRACT)
    add(boss_extrude17.mirror(Plane.XY))
    add(cut_extrude9.mirror(Plane.XY), mode=Mode.SUBTRACT)
    add(boss_extrude18.mirror(Plane.XY))


solid = part.part
